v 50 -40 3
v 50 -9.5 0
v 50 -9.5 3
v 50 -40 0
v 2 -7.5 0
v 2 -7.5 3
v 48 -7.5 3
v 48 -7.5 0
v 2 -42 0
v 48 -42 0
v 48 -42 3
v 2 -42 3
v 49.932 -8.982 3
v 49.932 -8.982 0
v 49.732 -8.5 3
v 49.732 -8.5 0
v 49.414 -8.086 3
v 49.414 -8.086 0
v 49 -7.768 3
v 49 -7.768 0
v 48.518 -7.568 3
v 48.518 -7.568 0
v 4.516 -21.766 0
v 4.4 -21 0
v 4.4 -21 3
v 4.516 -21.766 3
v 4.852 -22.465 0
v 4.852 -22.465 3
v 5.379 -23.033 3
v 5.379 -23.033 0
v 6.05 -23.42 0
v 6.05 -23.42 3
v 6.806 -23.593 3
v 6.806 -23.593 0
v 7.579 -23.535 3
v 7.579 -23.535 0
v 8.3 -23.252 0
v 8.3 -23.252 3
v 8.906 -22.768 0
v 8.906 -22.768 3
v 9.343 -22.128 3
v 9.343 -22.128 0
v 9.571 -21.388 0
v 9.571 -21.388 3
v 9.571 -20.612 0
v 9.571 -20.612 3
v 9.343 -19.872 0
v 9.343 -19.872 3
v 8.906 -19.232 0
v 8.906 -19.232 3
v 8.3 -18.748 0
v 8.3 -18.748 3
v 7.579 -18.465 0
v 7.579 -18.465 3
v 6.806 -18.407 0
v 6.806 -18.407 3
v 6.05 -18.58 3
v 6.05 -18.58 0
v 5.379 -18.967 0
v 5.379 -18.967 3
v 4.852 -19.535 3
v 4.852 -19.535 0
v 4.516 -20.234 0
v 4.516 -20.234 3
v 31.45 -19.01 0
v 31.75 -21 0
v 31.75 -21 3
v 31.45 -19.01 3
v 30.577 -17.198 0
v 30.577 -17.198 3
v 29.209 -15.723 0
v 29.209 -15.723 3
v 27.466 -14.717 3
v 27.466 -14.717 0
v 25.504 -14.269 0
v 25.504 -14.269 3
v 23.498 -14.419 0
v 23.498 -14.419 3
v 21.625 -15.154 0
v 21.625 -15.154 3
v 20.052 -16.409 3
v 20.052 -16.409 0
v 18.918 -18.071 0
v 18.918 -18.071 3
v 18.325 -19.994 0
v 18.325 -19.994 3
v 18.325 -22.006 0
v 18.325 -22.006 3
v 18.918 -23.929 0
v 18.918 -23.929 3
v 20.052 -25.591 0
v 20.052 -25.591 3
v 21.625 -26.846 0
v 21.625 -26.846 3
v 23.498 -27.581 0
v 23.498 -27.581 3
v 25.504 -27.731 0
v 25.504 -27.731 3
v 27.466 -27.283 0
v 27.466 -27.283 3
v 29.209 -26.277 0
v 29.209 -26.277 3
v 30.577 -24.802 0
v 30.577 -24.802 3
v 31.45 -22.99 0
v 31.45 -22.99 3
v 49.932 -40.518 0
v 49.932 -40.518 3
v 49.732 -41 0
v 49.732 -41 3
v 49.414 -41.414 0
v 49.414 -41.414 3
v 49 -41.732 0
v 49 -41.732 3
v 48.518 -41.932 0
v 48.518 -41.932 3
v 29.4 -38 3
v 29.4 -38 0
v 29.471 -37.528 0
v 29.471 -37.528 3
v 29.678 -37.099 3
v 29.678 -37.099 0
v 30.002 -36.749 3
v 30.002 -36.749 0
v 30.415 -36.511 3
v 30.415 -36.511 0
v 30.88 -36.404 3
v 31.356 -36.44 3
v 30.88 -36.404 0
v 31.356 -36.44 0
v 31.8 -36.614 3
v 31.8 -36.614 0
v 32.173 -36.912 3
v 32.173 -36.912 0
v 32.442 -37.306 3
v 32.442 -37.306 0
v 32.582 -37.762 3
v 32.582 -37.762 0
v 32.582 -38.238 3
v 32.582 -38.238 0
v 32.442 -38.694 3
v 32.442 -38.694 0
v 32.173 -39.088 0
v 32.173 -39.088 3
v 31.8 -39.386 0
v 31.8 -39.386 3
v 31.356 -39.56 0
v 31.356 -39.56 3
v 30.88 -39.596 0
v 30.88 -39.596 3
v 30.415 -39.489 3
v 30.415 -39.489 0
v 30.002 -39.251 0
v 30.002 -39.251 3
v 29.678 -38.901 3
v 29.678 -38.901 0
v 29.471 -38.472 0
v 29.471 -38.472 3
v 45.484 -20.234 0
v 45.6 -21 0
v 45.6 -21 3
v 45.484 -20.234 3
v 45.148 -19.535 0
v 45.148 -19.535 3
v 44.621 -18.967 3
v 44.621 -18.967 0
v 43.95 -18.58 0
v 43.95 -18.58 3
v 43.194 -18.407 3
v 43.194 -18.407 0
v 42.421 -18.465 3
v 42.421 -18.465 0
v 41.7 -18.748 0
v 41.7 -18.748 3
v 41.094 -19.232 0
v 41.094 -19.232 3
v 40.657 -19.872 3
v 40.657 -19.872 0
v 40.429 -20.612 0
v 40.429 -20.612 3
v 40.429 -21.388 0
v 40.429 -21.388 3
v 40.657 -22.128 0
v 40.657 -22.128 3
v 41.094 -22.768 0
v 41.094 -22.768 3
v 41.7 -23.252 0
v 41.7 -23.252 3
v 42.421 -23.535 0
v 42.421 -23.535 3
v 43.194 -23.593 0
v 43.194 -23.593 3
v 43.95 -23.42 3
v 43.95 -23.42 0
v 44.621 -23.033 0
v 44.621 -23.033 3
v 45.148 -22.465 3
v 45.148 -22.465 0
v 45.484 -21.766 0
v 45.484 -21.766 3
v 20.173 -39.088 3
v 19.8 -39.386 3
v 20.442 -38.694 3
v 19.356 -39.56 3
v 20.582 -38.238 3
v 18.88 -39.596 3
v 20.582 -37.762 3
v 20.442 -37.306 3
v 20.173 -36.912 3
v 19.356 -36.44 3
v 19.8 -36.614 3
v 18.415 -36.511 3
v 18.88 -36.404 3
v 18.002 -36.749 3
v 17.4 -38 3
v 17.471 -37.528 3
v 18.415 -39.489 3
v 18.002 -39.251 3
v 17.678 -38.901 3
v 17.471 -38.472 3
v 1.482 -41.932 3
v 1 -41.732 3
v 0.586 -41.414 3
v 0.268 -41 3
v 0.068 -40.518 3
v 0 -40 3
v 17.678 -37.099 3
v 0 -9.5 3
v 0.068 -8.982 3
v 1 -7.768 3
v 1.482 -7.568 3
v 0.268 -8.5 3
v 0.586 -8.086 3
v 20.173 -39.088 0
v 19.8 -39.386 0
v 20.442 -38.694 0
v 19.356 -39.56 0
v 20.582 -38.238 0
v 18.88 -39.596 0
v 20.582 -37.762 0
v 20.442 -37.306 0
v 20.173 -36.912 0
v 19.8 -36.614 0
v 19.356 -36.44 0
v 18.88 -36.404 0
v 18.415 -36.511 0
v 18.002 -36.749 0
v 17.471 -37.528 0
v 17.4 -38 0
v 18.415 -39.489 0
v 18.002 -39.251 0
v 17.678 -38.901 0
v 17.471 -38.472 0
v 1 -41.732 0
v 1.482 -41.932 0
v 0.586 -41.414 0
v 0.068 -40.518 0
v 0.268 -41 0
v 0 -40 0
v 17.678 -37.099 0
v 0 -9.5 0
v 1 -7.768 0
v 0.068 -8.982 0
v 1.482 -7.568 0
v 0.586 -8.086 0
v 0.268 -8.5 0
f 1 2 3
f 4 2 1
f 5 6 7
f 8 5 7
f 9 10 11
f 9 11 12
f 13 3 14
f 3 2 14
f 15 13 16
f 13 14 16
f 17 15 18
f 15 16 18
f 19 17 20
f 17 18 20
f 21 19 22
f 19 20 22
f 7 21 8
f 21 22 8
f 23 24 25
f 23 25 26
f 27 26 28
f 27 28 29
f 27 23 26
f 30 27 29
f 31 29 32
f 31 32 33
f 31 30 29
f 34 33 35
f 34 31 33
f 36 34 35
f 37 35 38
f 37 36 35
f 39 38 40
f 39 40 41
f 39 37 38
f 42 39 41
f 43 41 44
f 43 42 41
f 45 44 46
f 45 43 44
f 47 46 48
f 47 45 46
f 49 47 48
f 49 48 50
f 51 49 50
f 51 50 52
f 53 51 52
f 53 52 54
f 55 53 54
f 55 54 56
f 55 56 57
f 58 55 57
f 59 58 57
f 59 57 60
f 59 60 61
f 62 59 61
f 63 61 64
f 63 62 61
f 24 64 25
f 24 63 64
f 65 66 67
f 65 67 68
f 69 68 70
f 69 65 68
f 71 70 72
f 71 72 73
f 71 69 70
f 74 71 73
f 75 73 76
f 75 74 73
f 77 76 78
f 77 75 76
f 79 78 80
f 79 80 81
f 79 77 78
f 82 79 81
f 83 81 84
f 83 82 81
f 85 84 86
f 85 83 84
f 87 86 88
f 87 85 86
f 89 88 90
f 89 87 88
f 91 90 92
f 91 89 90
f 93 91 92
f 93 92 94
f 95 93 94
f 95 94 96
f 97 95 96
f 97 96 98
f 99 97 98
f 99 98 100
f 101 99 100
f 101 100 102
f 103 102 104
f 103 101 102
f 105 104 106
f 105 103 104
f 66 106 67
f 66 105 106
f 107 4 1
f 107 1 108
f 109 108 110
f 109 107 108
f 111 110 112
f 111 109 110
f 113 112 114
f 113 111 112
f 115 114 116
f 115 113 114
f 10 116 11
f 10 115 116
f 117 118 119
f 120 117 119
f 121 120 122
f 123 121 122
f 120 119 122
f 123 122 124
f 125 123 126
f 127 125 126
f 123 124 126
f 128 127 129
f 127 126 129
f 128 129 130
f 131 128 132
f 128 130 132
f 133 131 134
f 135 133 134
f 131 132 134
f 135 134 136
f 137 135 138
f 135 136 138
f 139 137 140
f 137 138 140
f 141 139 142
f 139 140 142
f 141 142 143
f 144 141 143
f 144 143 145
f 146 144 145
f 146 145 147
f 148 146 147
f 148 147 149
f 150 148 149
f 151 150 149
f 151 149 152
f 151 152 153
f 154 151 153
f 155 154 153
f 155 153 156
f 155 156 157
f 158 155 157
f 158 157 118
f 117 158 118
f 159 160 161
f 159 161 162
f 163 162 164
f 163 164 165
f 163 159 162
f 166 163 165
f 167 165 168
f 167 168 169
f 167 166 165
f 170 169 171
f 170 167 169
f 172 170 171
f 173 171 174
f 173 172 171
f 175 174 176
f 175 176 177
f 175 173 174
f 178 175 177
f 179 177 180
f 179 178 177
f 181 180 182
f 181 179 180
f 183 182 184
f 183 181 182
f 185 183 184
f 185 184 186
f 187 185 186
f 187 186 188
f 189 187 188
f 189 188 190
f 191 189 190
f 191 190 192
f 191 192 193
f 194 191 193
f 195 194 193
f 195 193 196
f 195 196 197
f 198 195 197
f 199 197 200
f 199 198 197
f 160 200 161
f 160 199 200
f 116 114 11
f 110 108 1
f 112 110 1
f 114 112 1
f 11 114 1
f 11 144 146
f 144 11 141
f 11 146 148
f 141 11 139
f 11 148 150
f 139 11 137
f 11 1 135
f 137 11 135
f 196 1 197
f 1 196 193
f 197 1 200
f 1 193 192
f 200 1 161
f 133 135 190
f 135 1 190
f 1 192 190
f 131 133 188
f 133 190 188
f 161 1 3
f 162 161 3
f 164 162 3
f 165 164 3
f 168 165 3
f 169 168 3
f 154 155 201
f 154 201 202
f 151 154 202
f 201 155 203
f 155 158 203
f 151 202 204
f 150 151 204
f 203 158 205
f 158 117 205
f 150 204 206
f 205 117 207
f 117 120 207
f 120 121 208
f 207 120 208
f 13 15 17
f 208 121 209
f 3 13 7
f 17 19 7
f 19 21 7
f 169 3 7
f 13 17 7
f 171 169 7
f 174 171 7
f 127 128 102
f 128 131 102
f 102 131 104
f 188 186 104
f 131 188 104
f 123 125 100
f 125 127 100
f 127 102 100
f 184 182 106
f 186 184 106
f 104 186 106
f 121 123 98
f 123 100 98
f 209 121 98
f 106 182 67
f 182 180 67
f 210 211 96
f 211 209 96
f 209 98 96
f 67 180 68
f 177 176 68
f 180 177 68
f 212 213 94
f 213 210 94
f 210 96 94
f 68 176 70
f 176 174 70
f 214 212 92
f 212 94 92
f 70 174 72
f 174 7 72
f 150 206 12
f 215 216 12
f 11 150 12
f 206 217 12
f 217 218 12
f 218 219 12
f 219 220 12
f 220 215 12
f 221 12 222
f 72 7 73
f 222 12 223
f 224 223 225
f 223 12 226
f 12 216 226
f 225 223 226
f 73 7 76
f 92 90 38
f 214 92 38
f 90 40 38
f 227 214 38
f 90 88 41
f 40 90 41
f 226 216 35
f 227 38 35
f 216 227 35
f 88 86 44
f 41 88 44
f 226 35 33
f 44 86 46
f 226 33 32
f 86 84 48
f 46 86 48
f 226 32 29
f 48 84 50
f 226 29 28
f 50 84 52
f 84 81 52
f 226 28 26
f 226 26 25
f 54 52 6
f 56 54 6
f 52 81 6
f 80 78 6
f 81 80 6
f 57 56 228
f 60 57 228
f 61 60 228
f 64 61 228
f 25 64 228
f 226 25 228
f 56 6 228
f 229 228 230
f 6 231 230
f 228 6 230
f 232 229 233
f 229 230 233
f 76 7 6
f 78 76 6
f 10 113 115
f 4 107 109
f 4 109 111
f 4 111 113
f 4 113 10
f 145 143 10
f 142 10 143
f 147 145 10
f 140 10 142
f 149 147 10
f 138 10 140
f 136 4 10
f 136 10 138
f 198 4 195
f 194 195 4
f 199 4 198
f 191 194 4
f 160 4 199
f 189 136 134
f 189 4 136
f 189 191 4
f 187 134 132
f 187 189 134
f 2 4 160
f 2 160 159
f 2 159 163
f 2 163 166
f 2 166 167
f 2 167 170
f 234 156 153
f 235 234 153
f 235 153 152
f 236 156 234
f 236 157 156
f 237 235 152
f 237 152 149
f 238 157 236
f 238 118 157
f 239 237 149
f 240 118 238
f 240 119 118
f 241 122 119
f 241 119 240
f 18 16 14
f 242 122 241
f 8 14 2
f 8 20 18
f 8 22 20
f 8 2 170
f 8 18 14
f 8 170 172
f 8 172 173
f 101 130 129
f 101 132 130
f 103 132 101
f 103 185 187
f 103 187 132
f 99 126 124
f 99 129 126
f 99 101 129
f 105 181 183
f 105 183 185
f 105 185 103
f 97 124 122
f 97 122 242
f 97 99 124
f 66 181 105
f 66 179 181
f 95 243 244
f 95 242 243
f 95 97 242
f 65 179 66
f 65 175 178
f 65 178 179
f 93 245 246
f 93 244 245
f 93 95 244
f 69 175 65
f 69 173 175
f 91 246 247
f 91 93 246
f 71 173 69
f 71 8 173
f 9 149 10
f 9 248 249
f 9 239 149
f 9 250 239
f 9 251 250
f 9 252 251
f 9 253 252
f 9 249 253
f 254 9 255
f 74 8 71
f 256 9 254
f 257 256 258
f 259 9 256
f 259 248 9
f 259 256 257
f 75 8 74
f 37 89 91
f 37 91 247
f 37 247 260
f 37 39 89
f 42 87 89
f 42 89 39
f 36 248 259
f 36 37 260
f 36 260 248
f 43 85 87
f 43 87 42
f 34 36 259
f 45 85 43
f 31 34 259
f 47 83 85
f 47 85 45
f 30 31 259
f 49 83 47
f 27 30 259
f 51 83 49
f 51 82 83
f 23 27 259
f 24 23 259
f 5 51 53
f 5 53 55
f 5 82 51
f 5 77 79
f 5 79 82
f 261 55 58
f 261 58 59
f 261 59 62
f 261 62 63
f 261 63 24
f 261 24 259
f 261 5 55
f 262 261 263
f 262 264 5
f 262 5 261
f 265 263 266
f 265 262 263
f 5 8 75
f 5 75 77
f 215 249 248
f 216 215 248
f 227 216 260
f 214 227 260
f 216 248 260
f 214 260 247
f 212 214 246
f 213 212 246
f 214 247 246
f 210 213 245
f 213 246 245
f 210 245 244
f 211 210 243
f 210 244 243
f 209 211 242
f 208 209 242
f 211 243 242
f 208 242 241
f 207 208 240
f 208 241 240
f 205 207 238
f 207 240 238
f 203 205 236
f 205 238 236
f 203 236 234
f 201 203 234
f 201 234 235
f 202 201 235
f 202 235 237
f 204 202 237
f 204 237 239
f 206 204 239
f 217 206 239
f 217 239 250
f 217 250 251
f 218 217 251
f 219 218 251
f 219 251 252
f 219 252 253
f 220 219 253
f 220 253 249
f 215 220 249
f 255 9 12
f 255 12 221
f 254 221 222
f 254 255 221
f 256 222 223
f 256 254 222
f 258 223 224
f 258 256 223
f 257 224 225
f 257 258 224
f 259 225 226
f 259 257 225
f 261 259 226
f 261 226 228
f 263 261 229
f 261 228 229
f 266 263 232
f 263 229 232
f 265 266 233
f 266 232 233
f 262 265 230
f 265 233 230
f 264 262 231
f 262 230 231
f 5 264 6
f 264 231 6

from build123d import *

# Parameters (mm, degrees)
SKETCH_1_R          = 6.75
SKETCH_1_R_2        = 2.6
EXTRUDE_1_DEPTH     = 3
SKETCH_2_R          = 1.6
CUT_EXTRUDE_1_DEPTH = 10
SKETCH_3_W          = 59.357674729
SKETCH_3_H          = 17.816533783
CUT_EXTRUDE_2_DEPTH = 10
FILLET_1_R          = 2


with BuildPart() as part:
    # 草图1 → 凸台-拉伸1 (new body)
    with BuildSketch(Plane.XY):
        with BuildLine():
            Line((2, 0), (48, 0))
            ThreePointArc((48, 0), (49.414213562, -0.585786438), (50, -2))
            Line((50, -2), (50, -40))
            ThreePointArc((50, -40), (49.414213562, -41.414213562), (48, -42))
            Line((48, -42), (2, -42))
            ThreePointArc((2, -42), (0.585786438, -41.414213562), (0, -40))
            Line((0, -40), (0, -2))
            ThreePointArc((0, -2), (0.585786438, -0.585786438), (2, 0))
        make_face()
        with Locations((25, -21)):
            Circle(SKETCH_1_R, mode=Mode.SUBTRACT)
        with Locations((43, -21)):
            Circle(SKETCH_1_R_2, mode=Mode.SUBTRACT)
        with Locations(Location((7, -21, 0), (0, 0, 180))):
            Circle(SKETCH_1_R_2, mode=Mode.SUBTRACT)
    extrude(amount=EXTRUDE_1_DEPTH)

    # 草图2 → 切除-拉伸1 (cut)
    with BuildSketch(Plane(origin=(0, 0, 0), x_dir=(-1, 0, 0), z_dir=(0, 0, -1))):
        with Locations((-19, -38)):
            Circle(SKETCH_2_R)
        with Locations((-31, -38)):
            Circle(SKETCH_2_R)
    extrude(amount=-CUT_EXTRUDE_1_DEPTH, mode=Mode.SUBTRACT)

    # 草图3 → 切除-拉伸2 (cut)
    with BuildSketch(Plane.XY.offset(3)):
        with Locations((23.80492675, 1.408266891)):
            Rectangle(SKETCH_3_W, SKETCH_3_H)
    extrude(amount=-CUT_EXTRUDE_2_DEPTH, mode=Mode.SUBTRACT)

    # 圆角1
    fillet_1_edges = [part.edges().sort_by_distance(p)[0] for p in [
        (50, -7.5, 1.5),
        (0, -7.5, 1.5),
    ]]
    fillet(fillet_1_edges, radius=FILLET_1_R)


solid = part.part
